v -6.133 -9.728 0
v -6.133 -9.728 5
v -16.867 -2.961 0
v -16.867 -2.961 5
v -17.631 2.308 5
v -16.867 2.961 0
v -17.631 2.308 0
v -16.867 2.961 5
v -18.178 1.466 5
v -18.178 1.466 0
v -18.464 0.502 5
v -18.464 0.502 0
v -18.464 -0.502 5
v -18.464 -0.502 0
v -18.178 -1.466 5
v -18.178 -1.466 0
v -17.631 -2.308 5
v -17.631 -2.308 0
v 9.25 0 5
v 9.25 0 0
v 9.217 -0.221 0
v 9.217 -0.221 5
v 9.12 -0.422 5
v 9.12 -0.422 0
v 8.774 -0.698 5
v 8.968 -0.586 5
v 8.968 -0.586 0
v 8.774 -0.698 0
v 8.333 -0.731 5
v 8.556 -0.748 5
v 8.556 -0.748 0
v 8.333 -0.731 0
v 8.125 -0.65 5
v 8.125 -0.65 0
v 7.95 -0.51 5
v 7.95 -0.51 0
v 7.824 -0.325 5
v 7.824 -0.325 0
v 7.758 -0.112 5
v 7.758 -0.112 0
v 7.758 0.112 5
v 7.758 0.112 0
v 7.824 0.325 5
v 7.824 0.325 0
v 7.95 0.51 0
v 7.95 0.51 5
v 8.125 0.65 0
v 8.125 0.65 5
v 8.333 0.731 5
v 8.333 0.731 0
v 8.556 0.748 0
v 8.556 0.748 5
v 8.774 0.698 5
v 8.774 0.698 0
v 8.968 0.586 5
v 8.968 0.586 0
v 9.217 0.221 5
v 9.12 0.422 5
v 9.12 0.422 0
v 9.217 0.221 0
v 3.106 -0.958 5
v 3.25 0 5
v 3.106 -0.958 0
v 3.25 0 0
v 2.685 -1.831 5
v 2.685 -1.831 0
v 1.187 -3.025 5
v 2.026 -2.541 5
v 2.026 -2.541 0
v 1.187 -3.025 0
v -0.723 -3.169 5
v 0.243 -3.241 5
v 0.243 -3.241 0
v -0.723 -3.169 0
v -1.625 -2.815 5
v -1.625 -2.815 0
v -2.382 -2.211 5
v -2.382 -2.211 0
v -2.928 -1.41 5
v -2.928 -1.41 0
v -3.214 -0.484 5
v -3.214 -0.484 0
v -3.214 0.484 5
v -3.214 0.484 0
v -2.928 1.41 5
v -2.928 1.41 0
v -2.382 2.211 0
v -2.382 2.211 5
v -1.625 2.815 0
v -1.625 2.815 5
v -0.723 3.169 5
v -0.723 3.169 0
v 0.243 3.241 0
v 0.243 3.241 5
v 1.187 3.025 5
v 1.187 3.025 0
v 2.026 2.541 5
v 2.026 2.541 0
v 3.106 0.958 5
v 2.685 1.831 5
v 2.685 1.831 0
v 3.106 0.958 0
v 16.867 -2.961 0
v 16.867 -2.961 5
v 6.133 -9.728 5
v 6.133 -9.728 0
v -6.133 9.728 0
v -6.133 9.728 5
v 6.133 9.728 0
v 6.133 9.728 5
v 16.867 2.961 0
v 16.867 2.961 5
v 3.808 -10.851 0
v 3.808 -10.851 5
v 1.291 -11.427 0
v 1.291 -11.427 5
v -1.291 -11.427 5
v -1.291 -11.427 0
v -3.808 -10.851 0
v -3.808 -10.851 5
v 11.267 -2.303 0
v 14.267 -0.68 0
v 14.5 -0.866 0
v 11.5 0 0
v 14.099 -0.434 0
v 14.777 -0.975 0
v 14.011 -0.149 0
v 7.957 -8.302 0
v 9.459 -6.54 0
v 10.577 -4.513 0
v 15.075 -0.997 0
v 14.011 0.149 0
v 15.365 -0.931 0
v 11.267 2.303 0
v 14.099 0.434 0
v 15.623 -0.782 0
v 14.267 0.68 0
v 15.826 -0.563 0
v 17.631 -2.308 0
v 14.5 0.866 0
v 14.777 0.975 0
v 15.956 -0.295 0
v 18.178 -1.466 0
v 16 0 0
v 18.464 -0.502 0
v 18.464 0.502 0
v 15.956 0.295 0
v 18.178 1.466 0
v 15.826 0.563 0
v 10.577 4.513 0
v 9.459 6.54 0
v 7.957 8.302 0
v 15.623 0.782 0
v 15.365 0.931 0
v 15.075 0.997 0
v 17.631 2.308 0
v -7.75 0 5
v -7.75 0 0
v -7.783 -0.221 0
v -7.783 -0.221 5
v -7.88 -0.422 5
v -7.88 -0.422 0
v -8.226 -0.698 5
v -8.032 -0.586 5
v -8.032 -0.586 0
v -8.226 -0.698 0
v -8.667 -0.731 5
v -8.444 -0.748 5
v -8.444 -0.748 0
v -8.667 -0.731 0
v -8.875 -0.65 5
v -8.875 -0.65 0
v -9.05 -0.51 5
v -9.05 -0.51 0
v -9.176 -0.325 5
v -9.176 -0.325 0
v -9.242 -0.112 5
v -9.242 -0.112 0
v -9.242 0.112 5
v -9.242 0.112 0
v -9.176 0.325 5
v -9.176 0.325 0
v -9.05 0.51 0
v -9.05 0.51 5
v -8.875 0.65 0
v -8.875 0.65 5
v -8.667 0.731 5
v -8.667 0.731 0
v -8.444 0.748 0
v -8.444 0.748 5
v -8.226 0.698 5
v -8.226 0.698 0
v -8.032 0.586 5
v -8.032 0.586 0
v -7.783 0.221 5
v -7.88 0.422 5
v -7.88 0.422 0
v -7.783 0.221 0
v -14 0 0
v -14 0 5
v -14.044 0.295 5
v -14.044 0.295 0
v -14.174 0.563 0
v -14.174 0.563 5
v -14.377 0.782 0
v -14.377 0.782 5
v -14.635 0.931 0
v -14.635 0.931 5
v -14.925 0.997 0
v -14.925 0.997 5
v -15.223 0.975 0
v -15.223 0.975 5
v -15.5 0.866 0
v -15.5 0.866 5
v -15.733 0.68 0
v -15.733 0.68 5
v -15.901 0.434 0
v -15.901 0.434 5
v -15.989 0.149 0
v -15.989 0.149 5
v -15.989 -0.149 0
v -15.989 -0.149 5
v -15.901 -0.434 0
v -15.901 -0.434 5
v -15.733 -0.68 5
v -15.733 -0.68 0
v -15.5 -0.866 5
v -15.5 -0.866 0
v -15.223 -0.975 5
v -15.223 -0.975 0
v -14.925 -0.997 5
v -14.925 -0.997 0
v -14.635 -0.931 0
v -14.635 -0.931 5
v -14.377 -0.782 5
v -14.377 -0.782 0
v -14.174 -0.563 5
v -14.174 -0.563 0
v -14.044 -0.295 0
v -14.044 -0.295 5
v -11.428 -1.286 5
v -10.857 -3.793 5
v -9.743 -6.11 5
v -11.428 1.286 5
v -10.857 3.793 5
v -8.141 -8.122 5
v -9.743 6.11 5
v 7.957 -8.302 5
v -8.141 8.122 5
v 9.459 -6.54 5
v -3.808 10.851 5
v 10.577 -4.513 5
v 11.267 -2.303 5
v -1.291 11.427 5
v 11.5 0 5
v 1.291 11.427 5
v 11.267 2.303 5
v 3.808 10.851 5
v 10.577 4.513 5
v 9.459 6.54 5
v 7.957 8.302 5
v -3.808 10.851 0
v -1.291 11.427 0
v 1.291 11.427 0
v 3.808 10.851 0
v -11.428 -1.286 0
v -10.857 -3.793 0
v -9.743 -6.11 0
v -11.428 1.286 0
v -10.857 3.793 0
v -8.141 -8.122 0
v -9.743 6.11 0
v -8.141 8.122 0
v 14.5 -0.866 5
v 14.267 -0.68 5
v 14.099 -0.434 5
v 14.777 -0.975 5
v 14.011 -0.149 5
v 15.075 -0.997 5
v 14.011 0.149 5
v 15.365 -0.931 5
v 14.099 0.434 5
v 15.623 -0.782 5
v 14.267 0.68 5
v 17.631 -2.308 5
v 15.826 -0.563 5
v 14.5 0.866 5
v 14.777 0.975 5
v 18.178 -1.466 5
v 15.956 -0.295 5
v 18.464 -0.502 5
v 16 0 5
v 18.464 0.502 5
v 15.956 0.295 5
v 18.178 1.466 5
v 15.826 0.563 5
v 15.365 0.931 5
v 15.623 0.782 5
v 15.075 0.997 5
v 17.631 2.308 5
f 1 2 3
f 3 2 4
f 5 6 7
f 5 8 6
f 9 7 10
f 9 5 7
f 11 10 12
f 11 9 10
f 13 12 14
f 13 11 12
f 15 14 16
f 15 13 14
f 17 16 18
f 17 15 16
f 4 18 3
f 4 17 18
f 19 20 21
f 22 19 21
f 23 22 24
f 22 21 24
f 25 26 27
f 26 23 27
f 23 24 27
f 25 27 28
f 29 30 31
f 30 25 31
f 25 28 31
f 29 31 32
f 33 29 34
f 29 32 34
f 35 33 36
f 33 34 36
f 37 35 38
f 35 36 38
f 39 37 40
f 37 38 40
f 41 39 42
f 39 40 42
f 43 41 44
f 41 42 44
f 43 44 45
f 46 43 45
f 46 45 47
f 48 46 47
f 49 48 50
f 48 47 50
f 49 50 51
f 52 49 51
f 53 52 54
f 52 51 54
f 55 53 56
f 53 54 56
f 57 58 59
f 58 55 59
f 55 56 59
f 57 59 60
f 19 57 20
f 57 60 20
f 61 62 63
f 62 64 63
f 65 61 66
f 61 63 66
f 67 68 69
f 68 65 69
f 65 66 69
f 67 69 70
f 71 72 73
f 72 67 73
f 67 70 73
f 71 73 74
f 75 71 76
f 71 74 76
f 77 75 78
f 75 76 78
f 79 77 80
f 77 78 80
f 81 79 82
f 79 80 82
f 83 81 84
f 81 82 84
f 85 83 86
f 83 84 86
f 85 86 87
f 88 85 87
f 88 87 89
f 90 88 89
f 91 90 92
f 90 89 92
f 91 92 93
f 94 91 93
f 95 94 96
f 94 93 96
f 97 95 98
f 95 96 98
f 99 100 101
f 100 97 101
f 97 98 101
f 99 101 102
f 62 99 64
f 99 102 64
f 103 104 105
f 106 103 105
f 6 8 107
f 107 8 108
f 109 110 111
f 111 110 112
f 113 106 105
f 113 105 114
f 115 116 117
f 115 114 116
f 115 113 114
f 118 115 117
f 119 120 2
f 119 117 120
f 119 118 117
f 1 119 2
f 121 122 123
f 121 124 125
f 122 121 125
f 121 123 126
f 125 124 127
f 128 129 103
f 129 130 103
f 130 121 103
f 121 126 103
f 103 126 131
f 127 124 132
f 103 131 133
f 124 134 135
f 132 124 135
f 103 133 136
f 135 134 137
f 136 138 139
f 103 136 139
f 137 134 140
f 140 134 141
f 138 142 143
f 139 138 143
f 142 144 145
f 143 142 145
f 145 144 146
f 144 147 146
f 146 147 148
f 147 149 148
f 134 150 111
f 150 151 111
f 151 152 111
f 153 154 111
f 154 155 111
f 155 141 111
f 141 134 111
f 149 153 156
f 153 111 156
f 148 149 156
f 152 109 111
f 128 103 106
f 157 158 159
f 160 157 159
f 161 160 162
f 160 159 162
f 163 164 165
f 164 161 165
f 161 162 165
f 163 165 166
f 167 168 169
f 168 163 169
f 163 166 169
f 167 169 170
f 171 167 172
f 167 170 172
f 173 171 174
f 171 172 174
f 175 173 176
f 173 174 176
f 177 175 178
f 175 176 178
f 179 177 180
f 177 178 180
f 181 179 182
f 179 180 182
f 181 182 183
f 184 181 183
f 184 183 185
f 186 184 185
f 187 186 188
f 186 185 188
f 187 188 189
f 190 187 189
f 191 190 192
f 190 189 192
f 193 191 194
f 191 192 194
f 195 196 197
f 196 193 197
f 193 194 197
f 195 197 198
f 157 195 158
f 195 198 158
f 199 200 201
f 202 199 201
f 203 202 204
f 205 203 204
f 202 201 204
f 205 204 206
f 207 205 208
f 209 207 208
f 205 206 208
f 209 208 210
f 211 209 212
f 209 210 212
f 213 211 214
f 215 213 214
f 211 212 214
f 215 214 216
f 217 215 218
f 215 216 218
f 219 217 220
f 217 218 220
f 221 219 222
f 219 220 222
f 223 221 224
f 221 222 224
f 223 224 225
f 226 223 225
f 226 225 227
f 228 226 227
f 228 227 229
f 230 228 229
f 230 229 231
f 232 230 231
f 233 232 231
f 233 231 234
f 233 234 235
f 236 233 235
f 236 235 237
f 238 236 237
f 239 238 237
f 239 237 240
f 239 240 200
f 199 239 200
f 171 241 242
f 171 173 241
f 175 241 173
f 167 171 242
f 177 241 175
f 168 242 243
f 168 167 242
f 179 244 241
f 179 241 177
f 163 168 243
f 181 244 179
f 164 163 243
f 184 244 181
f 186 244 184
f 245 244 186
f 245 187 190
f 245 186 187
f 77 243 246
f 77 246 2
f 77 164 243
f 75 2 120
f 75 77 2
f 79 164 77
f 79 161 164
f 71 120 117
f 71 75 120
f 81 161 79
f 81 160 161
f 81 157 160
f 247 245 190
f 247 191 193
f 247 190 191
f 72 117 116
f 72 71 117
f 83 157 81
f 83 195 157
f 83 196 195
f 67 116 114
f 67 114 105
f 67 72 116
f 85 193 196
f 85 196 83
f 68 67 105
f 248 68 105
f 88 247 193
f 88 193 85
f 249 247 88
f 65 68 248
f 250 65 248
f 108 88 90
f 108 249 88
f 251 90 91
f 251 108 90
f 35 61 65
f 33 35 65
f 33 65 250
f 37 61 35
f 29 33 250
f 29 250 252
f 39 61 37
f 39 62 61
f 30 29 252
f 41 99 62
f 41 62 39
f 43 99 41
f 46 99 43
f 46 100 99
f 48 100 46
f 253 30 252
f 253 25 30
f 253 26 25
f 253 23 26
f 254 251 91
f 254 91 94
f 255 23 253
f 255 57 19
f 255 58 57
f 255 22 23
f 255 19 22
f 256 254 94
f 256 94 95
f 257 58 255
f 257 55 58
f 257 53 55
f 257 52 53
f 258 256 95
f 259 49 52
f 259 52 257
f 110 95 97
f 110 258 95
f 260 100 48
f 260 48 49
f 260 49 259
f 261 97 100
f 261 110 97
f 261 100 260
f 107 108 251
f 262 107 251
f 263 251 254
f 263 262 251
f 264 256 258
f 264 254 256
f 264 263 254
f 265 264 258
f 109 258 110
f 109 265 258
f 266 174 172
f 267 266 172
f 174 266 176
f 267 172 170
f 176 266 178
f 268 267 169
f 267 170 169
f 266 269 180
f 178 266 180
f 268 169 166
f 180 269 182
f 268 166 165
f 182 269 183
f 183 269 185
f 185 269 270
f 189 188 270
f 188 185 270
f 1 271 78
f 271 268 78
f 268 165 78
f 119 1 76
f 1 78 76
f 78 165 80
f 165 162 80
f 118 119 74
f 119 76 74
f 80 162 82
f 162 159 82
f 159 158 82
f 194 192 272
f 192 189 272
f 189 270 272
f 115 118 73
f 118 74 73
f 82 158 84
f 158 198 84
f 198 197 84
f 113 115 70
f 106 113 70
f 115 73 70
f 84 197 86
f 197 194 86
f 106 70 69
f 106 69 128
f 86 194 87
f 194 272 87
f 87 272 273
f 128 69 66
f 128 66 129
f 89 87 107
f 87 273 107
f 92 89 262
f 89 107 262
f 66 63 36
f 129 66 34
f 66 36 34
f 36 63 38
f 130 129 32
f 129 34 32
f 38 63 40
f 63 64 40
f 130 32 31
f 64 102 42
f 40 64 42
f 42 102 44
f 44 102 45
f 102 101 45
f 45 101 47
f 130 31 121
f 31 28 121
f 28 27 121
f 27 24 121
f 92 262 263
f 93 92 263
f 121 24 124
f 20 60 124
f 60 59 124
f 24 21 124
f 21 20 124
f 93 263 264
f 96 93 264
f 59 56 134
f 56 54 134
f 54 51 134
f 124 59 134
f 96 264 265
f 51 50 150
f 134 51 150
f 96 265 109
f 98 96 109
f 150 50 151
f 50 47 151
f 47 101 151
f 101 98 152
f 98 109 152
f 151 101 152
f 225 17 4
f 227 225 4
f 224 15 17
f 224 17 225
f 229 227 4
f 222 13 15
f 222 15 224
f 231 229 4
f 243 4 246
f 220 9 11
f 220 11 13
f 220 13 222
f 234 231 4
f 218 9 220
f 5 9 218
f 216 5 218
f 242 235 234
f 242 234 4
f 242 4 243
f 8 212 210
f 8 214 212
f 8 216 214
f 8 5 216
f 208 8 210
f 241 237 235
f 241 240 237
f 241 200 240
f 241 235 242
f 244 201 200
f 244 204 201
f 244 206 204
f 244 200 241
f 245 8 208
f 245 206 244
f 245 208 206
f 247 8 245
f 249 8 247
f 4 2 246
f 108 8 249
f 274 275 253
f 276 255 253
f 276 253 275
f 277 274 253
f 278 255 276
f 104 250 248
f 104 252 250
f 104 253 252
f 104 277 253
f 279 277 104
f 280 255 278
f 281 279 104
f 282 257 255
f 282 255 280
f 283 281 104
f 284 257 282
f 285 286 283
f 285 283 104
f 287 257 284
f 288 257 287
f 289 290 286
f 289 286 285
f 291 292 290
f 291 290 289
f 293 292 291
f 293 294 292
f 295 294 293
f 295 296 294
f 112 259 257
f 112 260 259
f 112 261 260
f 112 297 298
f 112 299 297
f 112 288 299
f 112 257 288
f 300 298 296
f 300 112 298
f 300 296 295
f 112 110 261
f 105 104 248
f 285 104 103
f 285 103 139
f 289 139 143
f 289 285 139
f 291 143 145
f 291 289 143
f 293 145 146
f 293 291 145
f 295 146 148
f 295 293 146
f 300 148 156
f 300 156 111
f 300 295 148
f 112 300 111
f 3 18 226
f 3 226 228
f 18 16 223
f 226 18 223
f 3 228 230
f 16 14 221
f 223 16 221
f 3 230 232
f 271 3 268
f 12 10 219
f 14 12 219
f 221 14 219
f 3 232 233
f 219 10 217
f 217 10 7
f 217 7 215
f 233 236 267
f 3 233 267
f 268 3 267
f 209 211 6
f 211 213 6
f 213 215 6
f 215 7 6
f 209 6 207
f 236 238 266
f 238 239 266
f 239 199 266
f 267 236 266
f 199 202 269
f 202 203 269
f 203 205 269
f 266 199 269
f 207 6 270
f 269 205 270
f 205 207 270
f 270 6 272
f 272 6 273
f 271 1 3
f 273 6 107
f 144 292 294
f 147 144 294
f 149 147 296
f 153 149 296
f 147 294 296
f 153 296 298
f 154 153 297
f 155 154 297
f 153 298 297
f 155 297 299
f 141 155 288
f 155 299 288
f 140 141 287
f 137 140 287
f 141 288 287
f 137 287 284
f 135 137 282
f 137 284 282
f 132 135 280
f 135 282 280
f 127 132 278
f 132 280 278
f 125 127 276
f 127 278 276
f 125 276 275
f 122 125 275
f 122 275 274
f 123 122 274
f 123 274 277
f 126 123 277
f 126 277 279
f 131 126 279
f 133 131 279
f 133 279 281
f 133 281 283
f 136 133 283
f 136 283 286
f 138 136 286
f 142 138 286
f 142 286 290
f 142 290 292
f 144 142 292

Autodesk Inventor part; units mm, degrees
ref_plane "YZ Plane" through (0, 0, 0) normal (1, 0, 0) x (0, 1, 0)
ref_plane "XZ Plane" through (0, 0, 0) normal (0, 1, 0) x (-1, 0, 0)
ref_plane "XY Plane" through (0, 0, 0) normal (0, 0, 1) x (1, 0, 0)
sketch "Sketch1" plane through (0, 0, 0) normal (0, 0, 1) x (1, 0, 0)
  circle A0 centre (0, 0) radius 11.5
  circle A1 centre (0, 0) radius 3.25
  circle A2 centre (8.5, 0) radius 0.75
  circle A3 centre (-8.5, 0) radius 0.75
  dimension "d0" = 23
  dimension "d1" = 6.5
  dimension "d2" = 1.5
  dimension "d3" = 8.5
  dimension "d6" = 360
extrude "Extrusion1" add sketch "Sketch1" along normal blind 5
sketch "Sketch3" plane through (0, 0, 5) normal (0, 0, 1) x (1, 0, 0)
  circle A0 centre (15, 0) radius 1
  circle A1 centre (15, 0) radius 3.5
  circle A2 centre (0, 0) radius 11.5 projected
  line L0 (6.1333, 9.7279) -> (16.8667, 2.9607)
  line L1 (16.8667, -2.9607) -> (6.1333, -9.7279)
  circle A3 centre (0, 0) radius 11.5 projected
  arc A4 (6.1333, -9.7279) -> (6.1333, 9.7279) centre (0, 0) ccw
  circle A5 centre (-15, 0) radius 1
  circle A6 centre (-15, 0) radius 3.5
  line L2 (-6.1333, -9.7279) -> (-16.8667, -2.9607)
  line L3 (-16.8667, 2.9607) -> (-6.1333, 9.7279)
  arc A7 (-6.1333, 9.7279) -> (-6.1333, -9.7279) centre (0, 0) ccw
  dimension "d17" = 2
  dimension "d18" = 15
  dimension "d21" = 360
extrude "Extrusion3" add sketch "Sketch3" against normal blind 5 contours A1 | A1 A2 L0 | L1 A2 A1 | A2 A6 L3 | L2 A6 A2 | A6
properties part number "AC07" material "ABS Plastic"
